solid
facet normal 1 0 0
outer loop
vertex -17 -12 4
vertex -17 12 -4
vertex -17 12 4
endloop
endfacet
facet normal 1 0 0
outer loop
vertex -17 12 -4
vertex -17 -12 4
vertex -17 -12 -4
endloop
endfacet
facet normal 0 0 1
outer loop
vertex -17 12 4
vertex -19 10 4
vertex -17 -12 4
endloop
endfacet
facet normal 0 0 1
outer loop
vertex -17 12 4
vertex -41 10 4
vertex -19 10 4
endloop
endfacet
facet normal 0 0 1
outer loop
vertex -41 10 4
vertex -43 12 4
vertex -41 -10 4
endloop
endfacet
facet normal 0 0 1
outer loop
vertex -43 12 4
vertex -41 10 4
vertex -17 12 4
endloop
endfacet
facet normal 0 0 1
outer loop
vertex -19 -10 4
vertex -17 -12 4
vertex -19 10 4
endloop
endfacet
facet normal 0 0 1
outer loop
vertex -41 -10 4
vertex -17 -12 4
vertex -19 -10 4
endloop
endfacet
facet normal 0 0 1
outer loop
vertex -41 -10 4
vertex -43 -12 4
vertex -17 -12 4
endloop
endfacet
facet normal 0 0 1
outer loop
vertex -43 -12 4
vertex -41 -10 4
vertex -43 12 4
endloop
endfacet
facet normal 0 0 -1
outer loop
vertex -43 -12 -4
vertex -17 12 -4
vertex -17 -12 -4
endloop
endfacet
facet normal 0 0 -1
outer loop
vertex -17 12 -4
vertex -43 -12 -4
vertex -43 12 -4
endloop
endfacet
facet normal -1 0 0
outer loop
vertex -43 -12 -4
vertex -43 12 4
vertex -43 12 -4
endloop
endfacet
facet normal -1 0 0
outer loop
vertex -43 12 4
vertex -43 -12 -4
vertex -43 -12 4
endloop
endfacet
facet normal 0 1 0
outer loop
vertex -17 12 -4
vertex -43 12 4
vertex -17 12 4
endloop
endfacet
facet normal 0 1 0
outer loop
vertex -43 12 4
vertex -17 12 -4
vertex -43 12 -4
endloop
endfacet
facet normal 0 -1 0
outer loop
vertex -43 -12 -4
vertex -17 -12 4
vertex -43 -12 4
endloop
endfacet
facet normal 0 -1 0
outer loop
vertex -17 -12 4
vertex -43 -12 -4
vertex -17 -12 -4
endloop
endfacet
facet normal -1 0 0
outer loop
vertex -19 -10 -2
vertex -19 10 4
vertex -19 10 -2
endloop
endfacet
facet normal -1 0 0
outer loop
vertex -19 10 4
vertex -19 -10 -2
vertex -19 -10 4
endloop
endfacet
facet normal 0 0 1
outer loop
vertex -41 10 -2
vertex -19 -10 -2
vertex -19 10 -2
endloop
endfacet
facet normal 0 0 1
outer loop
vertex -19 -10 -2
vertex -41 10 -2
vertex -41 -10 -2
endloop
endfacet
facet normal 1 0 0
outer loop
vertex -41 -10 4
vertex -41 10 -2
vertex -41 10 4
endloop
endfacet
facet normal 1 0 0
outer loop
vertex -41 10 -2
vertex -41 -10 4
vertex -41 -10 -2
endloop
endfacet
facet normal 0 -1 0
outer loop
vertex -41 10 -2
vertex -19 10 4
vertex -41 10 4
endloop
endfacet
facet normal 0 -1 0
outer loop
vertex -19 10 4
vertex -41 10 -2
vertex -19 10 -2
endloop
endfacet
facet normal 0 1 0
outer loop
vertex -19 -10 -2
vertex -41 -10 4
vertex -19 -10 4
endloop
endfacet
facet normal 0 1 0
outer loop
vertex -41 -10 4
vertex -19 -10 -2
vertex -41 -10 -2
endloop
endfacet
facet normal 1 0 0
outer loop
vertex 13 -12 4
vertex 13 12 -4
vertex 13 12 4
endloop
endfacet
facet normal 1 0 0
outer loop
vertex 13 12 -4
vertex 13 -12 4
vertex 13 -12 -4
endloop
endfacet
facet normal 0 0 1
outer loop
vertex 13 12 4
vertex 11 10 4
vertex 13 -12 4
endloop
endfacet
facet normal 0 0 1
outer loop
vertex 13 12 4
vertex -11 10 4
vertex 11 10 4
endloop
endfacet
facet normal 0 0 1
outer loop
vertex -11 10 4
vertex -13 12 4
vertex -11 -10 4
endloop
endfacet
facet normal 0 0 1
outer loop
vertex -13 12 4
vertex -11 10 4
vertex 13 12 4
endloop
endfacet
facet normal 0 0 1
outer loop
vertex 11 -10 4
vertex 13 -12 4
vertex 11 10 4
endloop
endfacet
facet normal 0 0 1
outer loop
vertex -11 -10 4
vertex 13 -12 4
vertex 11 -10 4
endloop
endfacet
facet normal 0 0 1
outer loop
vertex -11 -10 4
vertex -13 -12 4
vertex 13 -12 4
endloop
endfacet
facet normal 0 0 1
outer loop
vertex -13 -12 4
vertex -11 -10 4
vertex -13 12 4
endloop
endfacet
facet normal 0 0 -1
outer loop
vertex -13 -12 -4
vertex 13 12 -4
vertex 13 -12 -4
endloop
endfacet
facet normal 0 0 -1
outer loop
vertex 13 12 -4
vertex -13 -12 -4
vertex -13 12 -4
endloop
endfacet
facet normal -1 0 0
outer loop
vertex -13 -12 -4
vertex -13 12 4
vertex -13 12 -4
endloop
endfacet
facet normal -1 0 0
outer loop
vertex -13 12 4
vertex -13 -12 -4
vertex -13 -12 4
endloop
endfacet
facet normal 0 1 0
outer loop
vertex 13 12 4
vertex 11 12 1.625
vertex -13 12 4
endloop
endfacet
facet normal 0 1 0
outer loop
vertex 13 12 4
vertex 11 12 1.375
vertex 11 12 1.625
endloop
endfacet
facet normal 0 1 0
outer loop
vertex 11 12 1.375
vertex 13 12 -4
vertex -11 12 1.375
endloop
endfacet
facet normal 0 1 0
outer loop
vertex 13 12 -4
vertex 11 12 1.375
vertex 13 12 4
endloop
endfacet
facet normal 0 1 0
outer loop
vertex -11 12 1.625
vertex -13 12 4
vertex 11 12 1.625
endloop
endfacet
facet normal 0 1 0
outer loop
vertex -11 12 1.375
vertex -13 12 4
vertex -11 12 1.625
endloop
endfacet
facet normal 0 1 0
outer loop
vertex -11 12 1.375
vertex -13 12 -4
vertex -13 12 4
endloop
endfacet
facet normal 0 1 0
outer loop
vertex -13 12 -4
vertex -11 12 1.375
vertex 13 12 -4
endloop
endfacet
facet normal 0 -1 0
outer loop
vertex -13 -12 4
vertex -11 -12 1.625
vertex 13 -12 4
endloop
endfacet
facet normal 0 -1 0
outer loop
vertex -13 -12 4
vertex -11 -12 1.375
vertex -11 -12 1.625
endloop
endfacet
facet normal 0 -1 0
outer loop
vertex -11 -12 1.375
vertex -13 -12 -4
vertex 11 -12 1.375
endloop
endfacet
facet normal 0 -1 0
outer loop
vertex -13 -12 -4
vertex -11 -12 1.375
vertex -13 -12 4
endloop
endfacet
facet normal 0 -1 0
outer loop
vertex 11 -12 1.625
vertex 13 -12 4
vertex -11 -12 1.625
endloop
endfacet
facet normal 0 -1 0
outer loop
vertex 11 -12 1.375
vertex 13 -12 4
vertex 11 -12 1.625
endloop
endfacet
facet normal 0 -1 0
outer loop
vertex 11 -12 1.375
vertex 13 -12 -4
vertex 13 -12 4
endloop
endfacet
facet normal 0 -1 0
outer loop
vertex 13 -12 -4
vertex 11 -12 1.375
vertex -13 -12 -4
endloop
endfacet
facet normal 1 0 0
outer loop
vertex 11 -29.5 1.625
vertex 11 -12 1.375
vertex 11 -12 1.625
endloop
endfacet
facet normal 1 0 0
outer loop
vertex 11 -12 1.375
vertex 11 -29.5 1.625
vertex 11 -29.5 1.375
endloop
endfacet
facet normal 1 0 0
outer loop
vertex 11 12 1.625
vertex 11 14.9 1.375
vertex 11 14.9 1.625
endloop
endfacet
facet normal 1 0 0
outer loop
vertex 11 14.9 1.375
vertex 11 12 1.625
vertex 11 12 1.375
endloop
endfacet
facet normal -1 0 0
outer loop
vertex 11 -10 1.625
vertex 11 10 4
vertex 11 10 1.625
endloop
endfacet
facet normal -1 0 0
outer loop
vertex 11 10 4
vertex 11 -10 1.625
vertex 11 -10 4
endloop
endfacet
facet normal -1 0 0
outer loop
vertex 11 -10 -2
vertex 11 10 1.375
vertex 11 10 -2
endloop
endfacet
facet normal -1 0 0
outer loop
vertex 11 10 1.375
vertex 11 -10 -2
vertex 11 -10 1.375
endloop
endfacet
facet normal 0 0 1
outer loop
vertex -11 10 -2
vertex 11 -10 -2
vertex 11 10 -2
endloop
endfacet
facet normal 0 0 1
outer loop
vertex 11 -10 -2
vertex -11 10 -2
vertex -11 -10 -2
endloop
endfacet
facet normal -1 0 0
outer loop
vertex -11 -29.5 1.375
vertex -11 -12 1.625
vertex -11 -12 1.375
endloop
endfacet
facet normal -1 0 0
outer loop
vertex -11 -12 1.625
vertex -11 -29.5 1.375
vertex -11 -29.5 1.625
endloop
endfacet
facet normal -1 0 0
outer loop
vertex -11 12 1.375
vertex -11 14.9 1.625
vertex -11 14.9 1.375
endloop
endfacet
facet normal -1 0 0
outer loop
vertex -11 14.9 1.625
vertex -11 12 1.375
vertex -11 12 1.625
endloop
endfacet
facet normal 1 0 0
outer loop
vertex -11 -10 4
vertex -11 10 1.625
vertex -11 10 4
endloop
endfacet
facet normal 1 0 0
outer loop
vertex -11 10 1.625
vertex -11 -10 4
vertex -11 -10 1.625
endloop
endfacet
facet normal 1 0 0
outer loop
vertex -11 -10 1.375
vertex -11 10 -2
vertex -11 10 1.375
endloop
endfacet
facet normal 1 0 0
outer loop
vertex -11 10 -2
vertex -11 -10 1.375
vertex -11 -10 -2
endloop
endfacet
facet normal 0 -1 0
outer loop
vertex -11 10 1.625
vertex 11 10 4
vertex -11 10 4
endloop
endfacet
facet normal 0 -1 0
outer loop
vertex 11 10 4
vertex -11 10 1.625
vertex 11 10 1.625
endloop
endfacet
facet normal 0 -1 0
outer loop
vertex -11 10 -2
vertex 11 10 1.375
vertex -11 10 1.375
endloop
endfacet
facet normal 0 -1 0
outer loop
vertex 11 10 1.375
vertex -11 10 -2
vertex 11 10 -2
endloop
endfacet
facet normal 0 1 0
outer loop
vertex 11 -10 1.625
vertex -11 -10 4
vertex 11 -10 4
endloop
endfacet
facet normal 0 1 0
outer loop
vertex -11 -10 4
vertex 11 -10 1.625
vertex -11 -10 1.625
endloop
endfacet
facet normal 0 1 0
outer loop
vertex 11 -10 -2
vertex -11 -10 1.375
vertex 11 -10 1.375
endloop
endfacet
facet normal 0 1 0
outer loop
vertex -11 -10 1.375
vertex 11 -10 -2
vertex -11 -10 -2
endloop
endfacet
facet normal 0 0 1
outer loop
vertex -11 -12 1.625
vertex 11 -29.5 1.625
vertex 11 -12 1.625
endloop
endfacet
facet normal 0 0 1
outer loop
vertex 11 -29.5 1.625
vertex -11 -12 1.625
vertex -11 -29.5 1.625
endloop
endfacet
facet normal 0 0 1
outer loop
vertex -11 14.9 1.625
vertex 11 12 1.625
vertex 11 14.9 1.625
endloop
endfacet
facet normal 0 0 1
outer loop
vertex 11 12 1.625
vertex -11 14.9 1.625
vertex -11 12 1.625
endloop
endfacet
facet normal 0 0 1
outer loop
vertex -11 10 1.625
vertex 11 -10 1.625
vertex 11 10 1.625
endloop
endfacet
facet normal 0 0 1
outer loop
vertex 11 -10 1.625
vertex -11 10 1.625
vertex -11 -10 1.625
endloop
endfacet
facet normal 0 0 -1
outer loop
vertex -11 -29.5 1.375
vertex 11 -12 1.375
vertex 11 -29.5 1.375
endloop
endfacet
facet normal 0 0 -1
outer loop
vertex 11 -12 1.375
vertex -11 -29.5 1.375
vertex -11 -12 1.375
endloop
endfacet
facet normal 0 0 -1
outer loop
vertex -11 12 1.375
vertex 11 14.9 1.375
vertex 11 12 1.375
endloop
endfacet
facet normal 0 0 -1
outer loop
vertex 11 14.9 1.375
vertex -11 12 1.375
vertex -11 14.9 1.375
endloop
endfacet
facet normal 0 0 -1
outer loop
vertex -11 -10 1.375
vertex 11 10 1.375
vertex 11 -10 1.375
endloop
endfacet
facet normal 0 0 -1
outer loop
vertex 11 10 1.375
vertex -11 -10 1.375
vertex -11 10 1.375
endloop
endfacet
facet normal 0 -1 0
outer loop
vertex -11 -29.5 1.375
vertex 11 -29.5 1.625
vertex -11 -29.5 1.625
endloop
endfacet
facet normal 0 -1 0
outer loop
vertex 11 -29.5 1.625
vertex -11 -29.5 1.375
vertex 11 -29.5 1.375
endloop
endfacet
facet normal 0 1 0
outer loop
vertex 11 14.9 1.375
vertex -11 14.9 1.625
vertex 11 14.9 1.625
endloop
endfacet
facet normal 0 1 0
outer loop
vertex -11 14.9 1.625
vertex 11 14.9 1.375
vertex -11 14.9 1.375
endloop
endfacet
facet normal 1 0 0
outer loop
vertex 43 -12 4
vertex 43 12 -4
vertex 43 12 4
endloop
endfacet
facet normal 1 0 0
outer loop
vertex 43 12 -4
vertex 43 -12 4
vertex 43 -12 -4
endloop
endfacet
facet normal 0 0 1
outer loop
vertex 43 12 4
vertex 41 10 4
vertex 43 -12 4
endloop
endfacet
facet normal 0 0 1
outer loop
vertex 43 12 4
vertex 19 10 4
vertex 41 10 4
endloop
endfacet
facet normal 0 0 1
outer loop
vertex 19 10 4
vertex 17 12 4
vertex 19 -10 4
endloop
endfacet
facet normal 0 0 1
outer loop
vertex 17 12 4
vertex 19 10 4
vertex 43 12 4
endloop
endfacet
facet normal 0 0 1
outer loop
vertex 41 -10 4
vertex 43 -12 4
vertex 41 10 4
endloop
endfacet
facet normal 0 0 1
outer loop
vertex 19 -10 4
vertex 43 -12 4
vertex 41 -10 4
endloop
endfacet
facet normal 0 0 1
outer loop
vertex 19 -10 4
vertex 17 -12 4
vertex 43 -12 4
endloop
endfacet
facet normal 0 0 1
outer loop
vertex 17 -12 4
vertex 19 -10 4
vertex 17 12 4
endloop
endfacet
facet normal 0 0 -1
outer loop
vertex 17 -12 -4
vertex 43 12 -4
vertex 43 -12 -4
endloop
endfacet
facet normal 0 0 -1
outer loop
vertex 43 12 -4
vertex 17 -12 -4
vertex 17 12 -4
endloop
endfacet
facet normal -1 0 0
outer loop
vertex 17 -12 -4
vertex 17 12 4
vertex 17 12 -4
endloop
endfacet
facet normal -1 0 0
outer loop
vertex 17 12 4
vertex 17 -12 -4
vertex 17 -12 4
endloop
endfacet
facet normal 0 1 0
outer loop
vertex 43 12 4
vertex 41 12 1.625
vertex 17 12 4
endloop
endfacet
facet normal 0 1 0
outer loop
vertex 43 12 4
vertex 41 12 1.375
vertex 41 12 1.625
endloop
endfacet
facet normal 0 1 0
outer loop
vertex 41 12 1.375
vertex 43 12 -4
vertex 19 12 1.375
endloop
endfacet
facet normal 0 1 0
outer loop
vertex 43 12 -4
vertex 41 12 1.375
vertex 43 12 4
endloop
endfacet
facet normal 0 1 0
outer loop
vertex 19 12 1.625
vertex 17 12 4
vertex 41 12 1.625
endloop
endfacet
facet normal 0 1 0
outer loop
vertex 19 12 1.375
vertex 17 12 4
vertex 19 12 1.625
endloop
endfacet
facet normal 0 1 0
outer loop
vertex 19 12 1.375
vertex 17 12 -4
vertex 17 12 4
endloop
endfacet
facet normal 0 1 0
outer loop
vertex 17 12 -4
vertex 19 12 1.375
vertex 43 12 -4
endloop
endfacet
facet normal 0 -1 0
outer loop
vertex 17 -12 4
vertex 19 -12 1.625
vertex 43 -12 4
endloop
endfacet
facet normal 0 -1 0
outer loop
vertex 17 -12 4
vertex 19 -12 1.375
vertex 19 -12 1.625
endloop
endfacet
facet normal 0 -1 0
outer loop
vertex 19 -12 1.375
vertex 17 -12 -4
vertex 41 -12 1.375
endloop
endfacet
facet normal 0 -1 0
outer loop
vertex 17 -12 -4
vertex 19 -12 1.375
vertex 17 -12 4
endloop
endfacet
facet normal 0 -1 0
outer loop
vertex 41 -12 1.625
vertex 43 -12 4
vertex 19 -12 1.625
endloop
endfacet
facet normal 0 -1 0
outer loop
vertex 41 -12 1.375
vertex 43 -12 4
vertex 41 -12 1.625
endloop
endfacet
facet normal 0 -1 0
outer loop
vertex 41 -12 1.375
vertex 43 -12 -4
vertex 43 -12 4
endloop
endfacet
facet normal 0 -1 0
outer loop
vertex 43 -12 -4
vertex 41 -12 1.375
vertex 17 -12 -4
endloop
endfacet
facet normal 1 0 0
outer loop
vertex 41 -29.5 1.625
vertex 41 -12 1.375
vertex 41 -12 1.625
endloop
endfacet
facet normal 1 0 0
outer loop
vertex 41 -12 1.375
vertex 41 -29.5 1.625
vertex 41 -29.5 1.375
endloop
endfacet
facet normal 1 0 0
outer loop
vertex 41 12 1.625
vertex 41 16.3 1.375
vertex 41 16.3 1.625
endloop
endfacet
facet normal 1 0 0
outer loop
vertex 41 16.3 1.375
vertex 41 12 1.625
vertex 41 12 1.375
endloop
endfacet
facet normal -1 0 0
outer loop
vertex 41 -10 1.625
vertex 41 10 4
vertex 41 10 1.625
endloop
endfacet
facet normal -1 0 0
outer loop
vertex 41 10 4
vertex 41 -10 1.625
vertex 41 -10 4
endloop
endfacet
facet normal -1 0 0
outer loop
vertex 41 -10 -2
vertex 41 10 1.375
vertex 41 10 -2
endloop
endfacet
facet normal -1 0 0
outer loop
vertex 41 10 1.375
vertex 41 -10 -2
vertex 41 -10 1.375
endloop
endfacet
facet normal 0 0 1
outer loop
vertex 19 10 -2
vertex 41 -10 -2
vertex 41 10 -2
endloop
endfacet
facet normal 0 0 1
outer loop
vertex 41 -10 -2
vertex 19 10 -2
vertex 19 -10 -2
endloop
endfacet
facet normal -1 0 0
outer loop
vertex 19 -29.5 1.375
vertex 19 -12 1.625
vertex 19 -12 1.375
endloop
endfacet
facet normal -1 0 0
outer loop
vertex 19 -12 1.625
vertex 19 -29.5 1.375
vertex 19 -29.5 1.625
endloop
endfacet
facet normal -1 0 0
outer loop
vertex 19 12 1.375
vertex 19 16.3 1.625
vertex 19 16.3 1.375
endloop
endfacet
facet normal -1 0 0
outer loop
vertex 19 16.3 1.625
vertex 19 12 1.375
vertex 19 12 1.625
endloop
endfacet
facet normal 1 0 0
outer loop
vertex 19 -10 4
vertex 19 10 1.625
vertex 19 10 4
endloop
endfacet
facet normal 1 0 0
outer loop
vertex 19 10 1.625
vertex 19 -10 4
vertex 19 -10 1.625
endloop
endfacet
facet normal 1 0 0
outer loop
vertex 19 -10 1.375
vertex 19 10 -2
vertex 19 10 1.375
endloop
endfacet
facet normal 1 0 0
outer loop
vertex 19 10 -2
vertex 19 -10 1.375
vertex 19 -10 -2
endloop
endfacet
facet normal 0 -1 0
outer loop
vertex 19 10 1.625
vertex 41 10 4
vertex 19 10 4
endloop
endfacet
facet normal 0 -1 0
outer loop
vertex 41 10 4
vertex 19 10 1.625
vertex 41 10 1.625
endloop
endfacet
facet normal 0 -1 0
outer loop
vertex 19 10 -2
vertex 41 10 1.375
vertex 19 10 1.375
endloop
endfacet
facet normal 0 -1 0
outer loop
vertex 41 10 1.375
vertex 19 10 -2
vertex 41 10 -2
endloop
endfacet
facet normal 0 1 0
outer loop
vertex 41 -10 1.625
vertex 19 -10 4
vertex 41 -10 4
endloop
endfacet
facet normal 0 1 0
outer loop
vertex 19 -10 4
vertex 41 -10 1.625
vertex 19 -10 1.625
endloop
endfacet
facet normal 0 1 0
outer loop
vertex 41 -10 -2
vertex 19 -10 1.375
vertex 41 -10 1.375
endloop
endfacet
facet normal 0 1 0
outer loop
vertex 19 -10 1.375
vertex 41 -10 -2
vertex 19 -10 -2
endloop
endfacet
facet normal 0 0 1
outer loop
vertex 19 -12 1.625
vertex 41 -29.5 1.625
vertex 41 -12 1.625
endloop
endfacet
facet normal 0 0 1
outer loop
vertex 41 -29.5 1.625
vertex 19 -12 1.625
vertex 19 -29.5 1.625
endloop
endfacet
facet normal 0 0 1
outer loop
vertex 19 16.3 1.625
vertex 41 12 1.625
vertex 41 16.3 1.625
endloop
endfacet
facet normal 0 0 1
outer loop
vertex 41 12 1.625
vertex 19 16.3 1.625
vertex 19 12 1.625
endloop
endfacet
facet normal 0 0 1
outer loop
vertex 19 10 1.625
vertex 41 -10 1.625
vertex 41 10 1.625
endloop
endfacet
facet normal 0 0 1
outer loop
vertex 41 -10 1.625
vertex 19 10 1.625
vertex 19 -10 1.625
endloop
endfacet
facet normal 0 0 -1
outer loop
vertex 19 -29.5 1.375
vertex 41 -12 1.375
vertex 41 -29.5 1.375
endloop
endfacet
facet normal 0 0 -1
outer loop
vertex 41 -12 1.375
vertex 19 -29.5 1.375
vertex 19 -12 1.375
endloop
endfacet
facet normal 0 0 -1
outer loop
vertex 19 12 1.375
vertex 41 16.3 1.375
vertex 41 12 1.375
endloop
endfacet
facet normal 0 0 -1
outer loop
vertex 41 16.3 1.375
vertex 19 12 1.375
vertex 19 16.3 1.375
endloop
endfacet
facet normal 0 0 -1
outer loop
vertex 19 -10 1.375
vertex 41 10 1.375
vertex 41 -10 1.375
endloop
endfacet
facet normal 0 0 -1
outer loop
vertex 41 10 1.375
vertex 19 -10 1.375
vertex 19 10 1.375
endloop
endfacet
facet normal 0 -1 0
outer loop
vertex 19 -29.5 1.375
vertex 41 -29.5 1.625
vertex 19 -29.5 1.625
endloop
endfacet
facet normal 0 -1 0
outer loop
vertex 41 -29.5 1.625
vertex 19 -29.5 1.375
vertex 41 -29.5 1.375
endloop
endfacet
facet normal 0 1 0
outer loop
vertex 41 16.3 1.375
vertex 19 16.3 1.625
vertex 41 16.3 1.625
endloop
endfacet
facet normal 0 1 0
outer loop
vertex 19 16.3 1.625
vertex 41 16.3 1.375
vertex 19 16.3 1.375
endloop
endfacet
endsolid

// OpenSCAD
/*
 * blade_storage_test.scad
 * Blade drawer and storage validation fixture.
 */

de_blade_length = 43;
de_blade_width = 22;
de_blade_thickness = 0.25;
blade_clearance = 0.4;

module drawer_for(blade_count) {
    difference() {
        cube([de_blade_width + 4, 24, 8], center=true);
        translate([0,0,1])
            cube([de_blade_width, 20, 6], center=true);
    }

    if (blade_count > 0) {
        translate([0, -8, 1.5])
            for (i = [0:blade_count-1]) {
                translate([0, i * 0.7, 0])
                    cube([de_blade_width, de_blade_length, de_blade_thickness], center=true);
            }
    }
}

// Empty drawer
translate([-30,0,0]) drawer_for(0);
// 3 blades
translate([0,0,0]) drawer_for(3);
// 5 blades
translate([30,0,0]) drawer_for(5);
